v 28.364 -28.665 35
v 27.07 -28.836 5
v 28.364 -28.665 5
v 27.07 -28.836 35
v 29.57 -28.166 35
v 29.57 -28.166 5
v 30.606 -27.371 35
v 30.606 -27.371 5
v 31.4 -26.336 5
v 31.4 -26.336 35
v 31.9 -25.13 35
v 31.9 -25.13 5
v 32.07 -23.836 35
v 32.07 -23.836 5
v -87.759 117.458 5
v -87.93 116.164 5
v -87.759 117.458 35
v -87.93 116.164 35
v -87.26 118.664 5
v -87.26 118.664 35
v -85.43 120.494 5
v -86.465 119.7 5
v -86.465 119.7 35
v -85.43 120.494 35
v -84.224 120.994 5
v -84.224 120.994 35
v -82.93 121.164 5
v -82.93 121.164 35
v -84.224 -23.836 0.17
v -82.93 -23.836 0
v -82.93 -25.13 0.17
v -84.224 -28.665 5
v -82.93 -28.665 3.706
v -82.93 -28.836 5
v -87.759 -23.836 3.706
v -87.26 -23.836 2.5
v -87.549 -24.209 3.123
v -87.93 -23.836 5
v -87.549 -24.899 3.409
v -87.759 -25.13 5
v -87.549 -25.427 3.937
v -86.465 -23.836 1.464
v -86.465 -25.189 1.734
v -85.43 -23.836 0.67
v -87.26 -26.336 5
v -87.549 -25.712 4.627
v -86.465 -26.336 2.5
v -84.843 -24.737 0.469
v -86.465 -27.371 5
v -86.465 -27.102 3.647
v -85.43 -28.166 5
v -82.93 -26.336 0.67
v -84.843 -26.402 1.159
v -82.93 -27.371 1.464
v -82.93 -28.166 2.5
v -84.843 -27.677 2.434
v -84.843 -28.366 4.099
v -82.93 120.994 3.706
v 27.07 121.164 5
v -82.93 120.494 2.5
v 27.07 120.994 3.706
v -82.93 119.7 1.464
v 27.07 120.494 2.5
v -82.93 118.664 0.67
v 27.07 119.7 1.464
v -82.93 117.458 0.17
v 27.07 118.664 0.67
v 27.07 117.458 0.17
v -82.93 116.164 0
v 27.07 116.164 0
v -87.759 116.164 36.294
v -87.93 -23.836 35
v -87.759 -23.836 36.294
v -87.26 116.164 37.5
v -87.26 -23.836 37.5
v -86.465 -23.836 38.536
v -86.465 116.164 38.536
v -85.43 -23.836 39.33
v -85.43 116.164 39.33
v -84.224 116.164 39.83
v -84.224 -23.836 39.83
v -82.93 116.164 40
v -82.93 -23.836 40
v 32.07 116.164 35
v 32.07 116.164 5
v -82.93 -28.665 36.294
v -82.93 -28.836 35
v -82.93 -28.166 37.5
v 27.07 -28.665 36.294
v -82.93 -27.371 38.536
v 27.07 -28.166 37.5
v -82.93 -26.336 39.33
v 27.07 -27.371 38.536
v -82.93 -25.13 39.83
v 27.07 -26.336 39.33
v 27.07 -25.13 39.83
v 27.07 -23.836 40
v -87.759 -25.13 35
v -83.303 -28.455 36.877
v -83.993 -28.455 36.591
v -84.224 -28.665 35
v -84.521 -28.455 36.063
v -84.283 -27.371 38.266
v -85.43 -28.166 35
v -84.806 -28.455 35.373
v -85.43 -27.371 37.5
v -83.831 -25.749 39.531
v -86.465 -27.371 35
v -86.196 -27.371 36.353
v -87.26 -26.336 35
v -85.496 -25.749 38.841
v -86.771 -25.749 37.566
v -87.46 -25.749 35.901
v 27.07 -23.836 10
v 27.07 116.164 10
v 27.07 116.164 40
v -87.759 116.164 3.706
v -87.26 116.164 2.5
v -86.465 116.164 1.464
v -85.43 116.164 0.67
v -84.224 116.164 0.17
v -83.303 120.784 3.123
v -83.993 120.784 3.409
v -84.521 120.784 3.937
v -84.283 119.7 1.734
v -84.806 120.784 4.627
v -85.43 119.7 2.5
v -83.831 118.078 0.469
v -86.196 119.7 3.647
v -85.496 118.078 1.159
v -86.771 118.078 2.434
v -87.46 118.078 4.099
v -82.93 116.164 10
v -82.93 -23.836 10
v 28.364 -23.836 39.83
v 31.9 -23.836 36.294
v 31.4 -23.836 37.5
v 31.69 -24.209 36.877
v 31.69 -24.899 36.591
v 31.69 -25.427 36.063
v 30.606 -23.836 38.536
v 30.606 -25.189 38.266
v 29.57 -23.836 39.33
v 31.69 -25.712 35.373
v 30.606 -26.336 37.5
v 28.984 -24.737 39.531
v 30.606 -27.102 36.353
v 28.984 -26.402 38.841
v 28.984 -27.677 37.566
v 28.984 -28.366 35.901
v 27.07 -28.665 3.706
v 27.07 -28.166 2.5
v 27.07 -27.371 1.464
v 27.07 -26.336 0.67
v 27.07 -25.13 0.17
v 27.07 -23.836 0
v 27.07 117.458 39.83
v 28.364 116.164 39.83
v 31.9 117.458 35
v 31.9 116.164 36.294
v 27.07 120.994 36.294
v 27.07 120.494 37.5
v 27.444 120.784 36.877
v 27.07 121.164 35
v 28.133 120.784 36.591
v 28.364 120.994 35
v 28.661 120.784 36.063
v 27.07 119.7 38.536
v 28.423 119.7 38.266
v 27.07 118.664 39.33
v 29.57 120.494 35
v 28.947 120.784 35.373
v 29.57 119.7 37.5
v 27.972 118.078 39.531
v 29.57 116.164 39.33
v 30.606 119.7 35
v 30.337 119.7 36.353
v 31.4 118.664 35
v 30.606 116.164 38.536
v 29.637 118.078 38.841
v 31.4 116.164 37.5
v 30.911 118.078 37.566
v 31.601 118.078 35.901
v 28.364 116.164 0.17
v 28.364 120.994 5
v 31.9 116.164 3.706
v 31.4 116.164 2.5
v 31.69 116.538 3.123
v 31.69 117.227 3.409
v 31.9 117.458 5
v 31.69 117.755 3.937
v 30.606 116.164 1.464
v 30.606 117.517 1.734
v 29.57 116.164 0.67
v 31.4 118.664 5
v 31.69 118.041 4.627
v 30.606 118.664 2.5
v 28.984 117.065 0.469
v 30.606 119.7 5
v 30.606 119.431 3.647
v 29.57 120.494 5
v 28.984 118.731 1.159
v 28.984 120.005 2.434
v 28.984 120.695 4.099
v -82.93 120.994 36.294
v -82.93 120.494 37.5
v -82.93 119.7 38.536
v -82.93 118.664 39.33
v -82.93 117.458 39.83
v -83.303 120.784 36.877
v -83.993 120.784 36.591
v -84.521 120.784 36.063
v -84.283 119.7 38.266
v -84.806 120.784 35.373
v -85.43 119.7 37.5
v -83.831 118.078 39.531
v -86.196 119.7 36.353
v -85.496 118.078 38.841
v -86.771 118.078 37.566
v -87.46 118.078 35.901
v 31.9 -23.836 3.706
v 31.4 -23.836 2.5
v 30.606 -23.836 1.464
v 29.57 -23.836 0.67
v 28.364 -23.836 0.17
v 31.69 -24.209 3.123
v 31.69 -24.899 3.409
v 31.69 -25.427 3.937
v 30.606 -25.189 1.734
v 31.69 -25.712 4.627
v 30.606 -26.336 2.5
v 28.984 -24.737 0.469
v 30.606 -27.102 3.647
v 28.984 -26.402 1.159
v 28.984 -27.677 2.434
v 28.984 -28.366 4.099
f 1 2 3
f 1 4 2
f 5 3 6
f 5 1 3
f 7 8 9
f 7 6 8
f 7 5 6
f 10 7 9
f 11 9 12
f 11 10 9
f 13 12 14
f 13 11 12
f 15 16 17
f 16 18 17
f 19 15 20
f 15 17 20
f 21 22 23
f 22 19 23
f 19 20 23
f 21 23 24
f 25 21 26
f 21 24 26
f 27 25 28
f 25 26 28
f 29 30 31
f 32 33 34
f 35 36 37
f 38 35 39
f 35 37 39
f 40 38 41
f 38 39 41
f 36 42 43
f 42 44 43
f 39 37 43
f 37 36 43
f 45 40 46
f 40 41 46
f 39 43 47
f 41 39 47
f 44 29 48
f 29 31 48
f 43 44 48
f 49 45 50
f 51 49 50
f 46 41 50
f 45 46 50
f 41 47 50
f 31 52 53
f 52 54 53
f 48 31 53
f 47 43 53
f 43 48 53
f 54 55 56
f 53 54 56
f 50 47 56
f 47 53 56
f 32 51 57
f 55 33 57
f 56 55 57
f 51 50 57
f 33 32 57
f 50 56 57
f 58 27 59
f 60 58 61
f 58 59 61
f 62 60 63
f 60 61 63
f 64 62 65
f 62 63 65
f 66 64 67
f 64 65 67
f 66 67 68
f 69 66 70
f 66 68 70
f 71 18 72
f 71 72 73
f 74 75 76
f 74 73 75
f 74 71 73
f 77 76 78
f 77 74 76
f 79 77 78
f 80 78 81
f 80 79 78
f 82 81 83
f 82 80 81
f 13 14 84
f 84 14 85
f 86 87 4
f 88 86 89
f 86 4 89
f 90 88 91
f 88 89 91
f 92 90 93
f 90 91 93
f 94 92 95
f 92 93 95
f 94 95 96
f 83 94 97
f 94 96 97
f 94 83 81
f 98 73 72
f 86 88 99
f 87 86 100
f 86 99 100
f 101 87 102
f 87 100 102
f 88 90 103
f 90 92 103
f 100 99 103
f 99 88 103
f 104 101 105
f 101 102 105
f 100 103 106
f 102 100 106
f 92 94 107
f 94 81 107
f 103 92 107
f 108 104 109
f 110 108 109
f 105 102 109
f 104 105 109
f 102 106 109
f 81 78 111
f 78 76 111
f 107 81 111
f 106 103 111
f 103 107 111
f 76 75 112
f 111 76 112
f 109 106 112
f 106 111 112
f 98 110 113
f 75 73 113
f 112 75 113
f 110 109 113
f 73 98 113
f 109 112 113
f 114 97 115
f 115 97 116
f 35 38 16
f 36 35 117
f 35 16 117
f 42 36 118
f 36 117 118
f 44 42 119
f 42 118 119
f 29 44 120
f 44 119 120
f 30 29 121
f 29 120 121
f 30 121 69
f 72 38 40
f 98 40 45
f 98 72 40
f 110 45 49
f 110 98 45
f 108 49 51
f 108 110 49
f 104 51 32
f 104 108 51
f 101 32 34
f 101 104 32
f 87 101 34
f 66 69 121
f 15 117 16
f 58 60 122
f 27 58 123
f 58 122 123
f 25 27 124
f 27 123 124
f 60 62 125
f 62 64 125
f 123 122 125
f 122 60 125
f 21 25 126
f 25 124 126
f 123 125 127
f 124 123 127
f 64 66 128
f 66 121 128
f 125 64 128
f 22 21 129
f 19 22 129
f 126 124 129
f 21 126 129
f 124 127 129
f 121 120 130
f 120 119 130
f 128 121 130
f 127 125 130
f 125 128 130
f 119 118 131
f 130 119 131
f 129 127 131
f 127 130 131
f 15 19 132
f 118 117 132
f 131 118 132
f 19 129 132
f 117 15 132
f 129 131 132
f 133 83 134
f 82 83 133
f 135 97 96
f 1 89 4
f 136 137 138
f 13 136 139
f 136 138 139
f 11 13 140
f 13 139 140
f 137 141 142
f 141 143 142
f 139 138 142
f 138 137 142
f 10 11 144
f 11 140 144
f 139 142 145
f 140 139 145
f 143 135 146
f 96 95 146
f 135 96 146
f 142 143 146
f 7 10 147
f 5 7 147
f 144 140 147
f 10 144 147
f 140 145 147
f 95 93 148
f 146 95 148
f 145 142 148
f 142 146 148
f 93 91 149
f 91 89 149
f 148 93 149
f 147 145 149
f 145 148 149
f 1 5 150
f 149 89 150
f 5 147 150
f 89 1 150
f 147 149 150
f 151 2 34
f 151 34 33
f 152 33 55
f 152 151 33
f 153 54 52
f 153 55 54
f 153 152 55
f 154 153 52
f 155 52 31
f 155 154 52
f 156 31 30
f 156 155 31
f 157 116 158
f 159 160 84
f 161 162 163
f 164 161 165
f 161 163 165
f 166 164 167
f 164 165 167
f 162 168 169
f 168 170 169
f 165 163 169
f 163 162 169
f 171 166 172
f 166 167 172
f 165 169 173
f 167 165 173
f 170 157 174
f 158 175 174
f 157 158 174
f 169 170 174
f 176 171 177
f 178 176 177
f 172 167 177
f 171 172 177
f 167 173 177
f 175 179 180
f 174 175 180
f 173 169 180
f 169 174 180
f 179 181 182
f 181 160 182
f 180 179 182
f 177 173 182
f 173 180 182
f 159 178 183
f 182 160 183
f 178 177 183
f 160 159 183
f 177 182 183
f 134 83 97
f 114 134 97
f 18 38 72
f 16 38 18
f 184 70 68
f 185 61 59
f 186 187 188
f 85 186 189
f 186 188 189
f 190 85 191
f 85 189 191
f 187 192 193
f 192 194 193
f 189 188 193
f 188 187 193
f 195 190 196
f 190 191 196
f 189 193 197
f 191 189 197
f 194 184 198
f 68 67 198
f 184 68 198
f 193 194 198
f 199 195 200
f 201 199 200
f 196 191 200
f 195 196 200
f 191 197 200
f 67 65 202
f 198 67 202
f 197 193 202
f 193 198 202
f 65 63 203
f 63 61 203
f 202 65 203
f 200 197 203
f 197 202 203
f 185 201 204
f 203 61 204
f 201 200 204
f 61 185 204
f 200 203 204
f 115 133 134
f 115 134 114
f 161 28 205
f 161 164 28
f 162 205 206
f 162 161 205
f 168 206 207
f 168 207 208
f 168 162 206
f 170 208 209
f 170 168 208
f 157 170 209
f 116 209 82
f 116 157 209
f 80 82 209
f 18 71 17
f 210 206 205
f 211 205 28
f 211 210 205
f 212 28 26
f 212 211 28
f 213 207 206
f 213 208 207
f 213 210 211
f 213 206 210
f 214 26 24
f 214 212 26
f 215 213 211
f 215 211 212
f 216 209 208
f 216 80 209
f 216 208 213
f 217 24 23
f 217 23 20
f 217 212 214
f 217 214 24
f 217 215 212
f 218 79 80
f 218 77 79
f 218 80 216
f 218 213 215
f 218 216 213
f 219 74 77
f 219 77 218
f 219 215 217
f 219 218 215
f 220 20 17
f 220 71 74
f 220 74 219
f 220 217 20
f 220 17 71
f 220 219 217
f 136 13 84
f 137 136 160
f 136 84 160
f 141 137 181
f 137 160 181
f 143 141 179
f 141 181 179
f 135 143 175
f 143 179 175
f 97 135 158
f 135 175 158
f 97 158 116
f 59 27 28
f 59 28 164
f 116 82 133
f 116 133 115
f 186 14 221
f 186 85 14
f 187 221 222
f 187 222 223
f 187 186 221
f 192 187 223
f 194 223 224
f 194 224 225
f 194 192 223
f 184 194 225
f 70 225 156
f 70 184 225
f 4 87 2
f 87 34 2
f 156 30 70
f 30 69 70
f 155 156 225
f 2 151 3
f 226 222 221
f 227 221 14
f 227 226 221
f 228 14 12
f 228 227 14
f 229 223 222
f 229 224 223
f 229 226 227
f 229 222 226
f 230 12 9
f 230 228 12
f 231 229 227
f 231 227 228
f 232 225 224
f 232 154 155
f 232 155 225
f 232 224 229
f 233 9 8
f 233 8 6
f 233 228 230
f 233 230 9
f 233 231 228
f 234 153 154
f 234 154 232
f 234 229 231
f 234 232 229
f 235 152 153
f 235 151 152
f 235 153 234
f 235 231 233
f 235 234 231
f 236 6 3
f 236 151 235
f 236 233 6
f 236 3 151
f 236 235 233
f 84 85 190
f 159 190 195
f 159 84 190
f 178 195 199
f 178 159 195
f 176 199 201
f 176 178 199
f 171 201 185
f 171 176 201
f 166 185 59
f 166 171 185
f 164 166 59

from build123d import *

# Parameters (mm, degrees)
SKETCH1_W           = 120
SKETCH1_H           = 150
BOSS_EXTRUDE1_DEPTH = 40
FILLET2_R           = 5
SKETCH2_W           = 110
SKETCH2_H           = 140
CUT_EXTRUDE1_DEPTH  = 30


with BuildPart() as part:
    # Sketch1 → Boss-Extrude1 (new body)
    with BuildSketch(Plane.XY):
        with Locations((-27.929641074, 46.164250059)):
            Rectangle(SKETCH1_W, SKETCH1_H)
    extrude(amount=BOSS_EXTRUDE1_DEPTH)

    # Fillet2
    fillet2_edges = [part.edges().sort_by_distance(p)[0] for p in [
        (-87.929641074, 46.164250059, 40),
        (-27.929641074, -28.835749941, 40),
        (32.070358926, 46.164250059, 40),
        (-27.929641074, -28.835749941, 0),
        (-87.929641074, 46.164250059, 0),
        (-27.929641074, 121.164250059, 0),
        (32.070358926, 46.164250059, 0),
        (-27.929641074, 121.164250059, 40),
        (32.070358926, -28.835749941, 20),
        (-87.929641074, -28.835749941, 20),
        (-87.929641074, 121.164250059, 20),
        (32.070358926, 121.164250059, 20),
    ]]
    fillet(fillet2_edges, radius=FILLET2_R)

    # Sketch2 → Cut-Extrude1 (cut)
    with BuildSketch(Plane.XY.offset(40)):
        with Locations((-27.929641074, 46.164250059)):
            Rectangle(SKETCH2_W, SKETCH2_H)
    extrude(amount=-CUT_EXTRUDE1_DEPTH, mode=Mode.SUBTRACT)


solid = part.part
